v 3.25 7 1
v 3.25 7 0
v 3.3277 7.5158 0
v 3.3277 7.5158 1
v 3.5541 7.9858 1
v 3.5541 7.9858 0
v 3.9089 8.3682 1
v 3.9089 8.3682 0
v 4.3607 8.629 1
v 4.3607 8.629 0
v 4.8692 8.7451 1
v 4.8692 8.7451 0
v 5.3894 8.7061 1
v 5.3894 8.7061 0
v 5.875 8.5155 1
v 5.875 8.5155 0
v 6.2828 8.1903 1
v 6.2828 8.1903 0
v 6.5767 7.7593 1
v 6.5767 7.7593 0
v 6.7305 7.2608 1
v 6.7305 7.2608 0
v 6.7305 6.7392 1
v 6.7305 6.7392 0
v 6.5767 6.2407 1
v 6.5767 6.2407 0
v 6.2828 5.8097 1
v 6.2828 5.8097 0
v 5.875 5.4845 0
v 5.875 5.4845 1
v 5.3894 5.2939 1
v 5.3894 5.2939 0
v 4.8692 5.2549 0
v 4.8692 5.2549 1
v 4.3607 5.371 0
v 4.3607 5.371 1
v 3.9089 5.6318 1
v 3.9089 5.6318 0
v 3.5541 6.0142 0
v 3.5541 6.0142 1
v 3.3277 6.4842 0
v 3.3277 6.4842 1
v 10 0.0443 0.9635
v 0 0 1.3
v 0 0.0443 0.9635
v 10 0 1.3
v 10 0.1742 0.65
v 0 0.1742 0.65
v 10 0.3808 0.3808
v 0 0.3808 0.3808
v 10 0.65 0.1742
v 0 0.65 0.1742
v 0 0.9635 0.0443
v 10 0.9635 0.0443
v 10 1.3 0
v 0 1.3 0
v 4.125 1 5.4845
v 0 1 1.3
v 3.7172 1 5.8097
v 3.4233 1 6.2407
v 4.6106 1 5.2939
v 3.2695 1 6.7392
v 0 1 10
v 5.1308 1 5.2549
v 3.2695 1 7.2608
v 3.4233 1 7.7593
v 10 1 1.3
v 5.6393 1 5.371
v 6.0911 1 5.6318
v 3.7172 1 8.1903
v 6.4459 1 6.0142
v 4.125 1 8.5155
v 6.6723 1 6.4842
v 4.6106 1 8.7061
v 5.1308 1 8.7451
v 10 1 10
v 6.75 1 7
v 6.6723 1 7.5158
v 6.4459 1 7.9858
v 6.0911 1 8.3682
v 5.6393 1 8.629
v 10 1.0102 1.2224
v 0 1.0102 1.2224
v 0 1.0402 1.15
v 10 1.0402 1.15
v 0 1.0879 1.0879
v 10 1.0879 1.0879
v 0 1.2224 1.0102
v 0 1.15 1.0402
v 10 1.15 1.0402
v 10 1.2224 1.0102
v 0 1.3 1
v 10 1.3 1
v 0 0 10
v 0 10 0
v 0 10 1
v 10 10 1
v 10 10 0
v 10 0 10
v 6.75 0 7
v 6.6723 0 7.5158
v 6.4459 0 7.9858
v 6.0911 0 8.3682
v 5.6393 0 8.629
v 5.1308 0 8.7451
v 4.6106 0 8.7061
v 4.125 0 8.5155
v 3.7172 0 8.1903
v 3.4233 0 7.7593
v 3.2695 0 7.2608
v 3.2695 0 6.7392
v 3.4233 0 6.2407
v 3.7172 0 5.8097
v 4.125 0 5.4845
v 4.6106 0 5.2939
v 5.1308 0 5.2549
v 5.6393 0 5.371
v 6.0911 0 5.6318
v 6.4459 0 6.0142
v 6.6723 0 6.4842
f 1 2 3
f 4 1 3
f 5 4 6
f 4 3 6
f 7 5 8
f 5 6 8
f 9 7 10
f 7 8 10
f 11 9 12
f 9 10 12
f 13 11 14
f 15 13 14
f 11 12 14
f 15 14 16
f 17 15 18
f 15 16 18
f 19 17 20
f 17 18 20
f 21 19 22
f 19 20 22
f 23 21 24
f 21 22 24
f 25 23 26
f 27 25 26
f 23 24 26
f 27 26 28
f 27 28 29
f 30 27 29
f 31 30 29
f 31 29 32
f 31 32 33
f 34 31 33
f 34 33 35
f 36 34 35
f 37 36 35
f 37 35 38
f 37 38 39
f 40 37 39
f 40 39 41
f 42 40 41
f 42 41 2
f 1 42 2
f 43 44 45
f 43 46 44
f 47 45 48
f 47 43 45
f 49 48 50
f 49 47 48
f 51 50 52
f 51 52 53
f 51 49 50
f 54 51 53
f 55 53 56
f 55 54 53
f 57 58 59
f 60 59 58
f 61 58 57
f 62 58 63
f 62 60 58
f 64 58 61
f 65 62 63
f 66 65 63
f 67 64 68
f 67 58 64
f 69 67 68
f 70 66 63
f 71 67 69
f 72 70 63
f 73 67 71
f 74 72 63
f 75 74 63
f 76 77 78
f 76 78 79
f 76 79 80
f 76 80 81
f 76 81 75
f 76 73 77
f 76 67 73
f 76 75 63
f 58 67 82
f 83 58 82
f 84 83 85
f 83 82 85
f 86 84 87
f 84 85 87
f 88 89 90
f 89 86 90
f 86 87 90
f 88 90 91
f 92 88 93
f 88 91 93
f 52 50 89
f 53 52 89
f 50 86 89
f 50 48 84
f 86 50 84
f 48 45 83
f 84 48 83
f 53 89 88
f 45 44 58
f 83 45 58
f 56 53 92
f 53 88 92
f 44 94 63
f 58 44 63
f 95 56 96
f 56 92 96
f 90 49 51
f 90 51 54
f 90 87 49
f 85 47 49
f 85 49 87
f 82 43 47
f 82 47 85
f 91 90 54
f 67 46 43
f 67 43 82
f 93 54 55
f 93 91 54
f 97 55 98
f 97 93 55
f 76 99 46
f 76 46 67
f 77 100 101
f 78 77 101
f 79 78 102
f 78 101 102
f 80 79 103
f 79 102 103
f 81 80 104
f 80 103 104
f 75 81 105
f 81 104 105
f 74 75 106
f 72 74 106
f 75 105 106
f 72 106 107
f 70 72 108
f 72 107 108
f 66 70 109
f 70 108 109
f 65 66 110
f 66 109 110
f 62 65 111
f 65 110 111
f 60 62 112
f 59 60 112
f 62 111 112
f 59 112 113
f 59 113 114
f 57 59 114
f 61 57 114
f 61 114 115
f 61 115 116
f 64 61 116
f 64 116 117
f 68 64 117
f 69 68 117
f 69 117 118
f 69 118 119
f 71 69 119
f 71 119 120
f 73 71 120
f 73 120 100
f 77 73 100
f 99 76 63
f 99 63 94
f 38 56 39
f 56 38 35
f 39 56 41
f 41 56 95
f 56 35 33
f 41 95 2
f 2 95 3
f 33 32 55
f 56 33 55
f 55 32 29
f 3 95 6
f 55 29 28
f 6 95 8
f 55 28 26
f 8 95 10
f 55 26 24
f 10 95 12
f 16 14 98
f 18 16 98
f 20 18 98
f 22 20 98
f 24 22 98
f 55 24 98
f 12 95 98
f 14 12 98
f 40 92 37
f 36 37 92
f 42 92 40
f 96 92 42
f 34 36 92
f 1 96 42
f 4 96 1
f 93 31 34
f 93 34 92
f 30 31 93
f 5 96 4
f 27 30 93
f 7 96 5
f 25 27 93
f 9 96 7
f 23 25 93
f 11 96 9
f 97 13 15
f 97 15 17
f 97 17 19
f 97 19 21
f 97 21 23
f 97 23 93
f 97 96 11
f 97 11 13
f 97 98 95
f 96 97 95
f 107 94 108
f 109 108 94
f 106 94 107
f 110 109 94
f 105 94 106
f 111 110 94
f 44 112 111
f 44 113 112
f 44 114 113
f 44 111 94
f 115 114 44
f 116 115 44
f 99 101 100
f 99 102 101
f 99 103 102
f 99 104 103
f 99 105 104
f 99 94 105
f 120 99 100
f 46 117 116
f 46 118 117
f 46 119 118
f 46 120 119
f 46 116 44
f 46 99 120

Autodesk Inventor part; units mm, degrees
ref_plane "YZ Plane" through (0, 0, 0) normal (1, 0, 0) x (0, 1, 0)
ref_plane "XZ Plane" through (0, 0, 0) normal (0, 1, 0) x (-1, 0, 0)
ref_plane "XY Plane" through (0, 0, 0) normal (0, 0, 1) x (1, 0, 0)
sketch "Sketch1" plane through (0, 0, 0) normal (0, 0, 1) x (1, 0, 0)
  line L0 (0, 0) -> (10, 0)
  line L1 (10, 0) -> (10, 10)
  line L2 (10, 10) -> (0, 10)
  line L3 (0, 10) -> (0, 0)
  dimension "d0" = 10
  dimension "d1" = 10
extrude "Plate1" add sketch "Sketch1" along normal blind 1
sketch "Sketch2" plane through (10, 1, 0) normal (0, -1, 0) x (1, 0, 0)
  line L0 (-10, 0) -> (0, 0)
  line L1 (0, 0) -> (0, 10)
  line L2 (0, 10) -> (-10, 10)
  line L3 (-10, 10) -> (-10, 0)
edge flange "Flange1" height 10 angle 90 thickness 1 bend radius 0.3 thickness toward (0, -1, 0) relief tear relief width 1 relief depth 0.5 edges at (5, 0, 1) wall of the first edge with corners at (0, 1, 0) (10, 1, 0) (10, 1, 10) (0, 1, 10)
bend "Bend1"
corner "Corner1"
sketch "Sketch3" plane through (0, 0, 0) normal (0, 0, -1) x (-1, 0, 0)
  circle A0 centre (-5, 7) radius 1.75
  line L0 (-10, 10) -> (0, 10) projected
  line L1 (-10, 1) -> (0, 1) projected
  point P0 (0, 0)
  point P1 (-5, 10)
  dimension "d13" = 3.5
  dimension "d14" = 6
extrude "Extrusion1" cut sketch "Sketch3" against normal blind 10
sketch "Sketch4" plane through (0, 0, 10) normal (0, -1, 0) x (1, 0, 0)
  circle A0 centre (5, -3) radius 1.75
  line L0 (0, -9) -> (10, -9) projected
  line L1 (0, 0) -> (10, 0) projected
  point P0 (0, -10)
  point P1 (5, 0)
  dimension "d17" = 3.5
  dimension "d18" = 6
extrude "Extrusion2" cut sketch "Sketch4" against normal blind 10
equation "\"d2\" = 厚度"
equation "\"d3\" = 折彎離隙寬度"
equation "\"d4\" = 折彎離隙深度"
equation "\"d5\" = 最小剩餘"
equation "\"d6\" = 轉移半徑"
equation "\"d10\" = 轉角離隙大小"
equation "\"d11\" = 間隙大小"
equation "\"d12\" = Jacobi半徑大小"
equation "\"折彎半徑\" = 厚度"
equation "\"折彎離隙寬度\" = 厚度"
equation "\"折彎離隙深度\" = 0.5 * 厚度"
equation "\"轉角離隙大小\" = 4 * 厚度"
equation "\"最小剩餘\" = 2 * 厚度"
equation "\"轉移半徑\" = 折彎半徑"
equation "\"Jacobi半徑大小\" = 折彎半徑"
equation "\"間隙大小\" = 厚度"
equation "\"厚度\" = 1"
properties part number "joint"
